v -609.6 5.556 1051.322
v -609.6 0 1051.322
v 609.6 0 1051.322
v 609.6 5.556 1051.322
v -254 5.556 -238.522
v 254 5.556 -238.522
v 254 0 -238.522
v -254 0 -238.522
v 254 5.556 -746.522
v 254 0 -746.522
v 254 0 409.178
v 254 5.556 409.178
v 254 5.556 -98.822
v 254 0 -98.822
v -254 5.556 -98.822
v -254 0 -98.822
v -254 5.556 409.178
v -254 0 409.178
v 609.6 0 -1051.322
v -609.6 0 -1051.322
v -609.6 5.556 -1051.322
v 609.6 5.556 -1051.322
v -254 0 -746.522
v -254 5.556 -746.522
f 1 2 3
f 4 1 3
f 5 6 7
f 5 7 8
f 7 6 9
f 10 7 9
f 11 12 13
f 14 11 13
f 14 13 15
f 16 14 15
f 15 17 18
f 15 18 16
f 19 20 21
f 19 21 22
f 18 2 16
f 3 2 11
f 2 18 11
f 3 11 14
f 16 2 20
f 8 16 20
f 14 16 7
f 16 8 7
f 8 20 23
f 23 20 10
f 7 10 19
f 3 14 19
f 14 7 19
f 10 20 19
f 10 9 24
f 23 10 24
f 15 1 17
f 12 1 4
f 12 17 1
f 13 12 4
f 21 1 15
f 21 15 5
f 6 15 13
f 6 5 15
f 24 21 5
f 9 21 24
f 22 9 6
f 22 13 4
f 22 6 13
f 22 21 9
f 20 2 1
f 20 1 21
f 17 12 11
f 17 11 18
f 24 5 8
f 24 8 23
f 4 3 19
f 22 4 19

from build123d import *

# Parameters (mm, degrees)
SKETCH1_W               = 1219.2
SKETCH1_H               = 2102.64375
BOSS_EXTRUDE1_DEPTH     = 5.55625
CUT_EXTRUDE1_DEPTH      = 1216.286269472
CUT_EXTRUDE1_DEPTH_BACK = 1216.286269472
SKETCH2_W               = 508
SKETCH2_H               = 508


with BuildPart() as part:
    # Sketch1 → Boss-Extrude1 (new body)
    with BuildSketch(Plane(origin=(0, 0, 0), x_dir=(1, 0, 0), z_dir=(0, 1, 0))):
        Rectangle(SKETCH1_W, SKETCH1_H)
    extrude(amount=BOSS_EXTRUDE1_DEPTH)

    # Sketch2 → Cut-Extrude1 (cut, two sides: drawn at the far end of the back side and taken through both)
    with BuildSketch(Plane(origin=(0, 0, 0), x_dir=(-1, 0, 0), z_dir=(0, -1, 0)).offset(-CUT_EXTRUDE1_DEPTH_BACK)):
        with Locations((0, 492.521875)):
            Rectangle(SKETCH2_W, SKETCH2_H)
        with Locations((0, -155.178125)):
            Rectangle(SKETCH2_W, SKETCH2_H)
    extrude(amount=CUT_EXTRUDE1_DEPTH + CUT_EXTRUDE1_DEPTH_BACK, mode=Mode.SUBTRACT)


solid = part.part
